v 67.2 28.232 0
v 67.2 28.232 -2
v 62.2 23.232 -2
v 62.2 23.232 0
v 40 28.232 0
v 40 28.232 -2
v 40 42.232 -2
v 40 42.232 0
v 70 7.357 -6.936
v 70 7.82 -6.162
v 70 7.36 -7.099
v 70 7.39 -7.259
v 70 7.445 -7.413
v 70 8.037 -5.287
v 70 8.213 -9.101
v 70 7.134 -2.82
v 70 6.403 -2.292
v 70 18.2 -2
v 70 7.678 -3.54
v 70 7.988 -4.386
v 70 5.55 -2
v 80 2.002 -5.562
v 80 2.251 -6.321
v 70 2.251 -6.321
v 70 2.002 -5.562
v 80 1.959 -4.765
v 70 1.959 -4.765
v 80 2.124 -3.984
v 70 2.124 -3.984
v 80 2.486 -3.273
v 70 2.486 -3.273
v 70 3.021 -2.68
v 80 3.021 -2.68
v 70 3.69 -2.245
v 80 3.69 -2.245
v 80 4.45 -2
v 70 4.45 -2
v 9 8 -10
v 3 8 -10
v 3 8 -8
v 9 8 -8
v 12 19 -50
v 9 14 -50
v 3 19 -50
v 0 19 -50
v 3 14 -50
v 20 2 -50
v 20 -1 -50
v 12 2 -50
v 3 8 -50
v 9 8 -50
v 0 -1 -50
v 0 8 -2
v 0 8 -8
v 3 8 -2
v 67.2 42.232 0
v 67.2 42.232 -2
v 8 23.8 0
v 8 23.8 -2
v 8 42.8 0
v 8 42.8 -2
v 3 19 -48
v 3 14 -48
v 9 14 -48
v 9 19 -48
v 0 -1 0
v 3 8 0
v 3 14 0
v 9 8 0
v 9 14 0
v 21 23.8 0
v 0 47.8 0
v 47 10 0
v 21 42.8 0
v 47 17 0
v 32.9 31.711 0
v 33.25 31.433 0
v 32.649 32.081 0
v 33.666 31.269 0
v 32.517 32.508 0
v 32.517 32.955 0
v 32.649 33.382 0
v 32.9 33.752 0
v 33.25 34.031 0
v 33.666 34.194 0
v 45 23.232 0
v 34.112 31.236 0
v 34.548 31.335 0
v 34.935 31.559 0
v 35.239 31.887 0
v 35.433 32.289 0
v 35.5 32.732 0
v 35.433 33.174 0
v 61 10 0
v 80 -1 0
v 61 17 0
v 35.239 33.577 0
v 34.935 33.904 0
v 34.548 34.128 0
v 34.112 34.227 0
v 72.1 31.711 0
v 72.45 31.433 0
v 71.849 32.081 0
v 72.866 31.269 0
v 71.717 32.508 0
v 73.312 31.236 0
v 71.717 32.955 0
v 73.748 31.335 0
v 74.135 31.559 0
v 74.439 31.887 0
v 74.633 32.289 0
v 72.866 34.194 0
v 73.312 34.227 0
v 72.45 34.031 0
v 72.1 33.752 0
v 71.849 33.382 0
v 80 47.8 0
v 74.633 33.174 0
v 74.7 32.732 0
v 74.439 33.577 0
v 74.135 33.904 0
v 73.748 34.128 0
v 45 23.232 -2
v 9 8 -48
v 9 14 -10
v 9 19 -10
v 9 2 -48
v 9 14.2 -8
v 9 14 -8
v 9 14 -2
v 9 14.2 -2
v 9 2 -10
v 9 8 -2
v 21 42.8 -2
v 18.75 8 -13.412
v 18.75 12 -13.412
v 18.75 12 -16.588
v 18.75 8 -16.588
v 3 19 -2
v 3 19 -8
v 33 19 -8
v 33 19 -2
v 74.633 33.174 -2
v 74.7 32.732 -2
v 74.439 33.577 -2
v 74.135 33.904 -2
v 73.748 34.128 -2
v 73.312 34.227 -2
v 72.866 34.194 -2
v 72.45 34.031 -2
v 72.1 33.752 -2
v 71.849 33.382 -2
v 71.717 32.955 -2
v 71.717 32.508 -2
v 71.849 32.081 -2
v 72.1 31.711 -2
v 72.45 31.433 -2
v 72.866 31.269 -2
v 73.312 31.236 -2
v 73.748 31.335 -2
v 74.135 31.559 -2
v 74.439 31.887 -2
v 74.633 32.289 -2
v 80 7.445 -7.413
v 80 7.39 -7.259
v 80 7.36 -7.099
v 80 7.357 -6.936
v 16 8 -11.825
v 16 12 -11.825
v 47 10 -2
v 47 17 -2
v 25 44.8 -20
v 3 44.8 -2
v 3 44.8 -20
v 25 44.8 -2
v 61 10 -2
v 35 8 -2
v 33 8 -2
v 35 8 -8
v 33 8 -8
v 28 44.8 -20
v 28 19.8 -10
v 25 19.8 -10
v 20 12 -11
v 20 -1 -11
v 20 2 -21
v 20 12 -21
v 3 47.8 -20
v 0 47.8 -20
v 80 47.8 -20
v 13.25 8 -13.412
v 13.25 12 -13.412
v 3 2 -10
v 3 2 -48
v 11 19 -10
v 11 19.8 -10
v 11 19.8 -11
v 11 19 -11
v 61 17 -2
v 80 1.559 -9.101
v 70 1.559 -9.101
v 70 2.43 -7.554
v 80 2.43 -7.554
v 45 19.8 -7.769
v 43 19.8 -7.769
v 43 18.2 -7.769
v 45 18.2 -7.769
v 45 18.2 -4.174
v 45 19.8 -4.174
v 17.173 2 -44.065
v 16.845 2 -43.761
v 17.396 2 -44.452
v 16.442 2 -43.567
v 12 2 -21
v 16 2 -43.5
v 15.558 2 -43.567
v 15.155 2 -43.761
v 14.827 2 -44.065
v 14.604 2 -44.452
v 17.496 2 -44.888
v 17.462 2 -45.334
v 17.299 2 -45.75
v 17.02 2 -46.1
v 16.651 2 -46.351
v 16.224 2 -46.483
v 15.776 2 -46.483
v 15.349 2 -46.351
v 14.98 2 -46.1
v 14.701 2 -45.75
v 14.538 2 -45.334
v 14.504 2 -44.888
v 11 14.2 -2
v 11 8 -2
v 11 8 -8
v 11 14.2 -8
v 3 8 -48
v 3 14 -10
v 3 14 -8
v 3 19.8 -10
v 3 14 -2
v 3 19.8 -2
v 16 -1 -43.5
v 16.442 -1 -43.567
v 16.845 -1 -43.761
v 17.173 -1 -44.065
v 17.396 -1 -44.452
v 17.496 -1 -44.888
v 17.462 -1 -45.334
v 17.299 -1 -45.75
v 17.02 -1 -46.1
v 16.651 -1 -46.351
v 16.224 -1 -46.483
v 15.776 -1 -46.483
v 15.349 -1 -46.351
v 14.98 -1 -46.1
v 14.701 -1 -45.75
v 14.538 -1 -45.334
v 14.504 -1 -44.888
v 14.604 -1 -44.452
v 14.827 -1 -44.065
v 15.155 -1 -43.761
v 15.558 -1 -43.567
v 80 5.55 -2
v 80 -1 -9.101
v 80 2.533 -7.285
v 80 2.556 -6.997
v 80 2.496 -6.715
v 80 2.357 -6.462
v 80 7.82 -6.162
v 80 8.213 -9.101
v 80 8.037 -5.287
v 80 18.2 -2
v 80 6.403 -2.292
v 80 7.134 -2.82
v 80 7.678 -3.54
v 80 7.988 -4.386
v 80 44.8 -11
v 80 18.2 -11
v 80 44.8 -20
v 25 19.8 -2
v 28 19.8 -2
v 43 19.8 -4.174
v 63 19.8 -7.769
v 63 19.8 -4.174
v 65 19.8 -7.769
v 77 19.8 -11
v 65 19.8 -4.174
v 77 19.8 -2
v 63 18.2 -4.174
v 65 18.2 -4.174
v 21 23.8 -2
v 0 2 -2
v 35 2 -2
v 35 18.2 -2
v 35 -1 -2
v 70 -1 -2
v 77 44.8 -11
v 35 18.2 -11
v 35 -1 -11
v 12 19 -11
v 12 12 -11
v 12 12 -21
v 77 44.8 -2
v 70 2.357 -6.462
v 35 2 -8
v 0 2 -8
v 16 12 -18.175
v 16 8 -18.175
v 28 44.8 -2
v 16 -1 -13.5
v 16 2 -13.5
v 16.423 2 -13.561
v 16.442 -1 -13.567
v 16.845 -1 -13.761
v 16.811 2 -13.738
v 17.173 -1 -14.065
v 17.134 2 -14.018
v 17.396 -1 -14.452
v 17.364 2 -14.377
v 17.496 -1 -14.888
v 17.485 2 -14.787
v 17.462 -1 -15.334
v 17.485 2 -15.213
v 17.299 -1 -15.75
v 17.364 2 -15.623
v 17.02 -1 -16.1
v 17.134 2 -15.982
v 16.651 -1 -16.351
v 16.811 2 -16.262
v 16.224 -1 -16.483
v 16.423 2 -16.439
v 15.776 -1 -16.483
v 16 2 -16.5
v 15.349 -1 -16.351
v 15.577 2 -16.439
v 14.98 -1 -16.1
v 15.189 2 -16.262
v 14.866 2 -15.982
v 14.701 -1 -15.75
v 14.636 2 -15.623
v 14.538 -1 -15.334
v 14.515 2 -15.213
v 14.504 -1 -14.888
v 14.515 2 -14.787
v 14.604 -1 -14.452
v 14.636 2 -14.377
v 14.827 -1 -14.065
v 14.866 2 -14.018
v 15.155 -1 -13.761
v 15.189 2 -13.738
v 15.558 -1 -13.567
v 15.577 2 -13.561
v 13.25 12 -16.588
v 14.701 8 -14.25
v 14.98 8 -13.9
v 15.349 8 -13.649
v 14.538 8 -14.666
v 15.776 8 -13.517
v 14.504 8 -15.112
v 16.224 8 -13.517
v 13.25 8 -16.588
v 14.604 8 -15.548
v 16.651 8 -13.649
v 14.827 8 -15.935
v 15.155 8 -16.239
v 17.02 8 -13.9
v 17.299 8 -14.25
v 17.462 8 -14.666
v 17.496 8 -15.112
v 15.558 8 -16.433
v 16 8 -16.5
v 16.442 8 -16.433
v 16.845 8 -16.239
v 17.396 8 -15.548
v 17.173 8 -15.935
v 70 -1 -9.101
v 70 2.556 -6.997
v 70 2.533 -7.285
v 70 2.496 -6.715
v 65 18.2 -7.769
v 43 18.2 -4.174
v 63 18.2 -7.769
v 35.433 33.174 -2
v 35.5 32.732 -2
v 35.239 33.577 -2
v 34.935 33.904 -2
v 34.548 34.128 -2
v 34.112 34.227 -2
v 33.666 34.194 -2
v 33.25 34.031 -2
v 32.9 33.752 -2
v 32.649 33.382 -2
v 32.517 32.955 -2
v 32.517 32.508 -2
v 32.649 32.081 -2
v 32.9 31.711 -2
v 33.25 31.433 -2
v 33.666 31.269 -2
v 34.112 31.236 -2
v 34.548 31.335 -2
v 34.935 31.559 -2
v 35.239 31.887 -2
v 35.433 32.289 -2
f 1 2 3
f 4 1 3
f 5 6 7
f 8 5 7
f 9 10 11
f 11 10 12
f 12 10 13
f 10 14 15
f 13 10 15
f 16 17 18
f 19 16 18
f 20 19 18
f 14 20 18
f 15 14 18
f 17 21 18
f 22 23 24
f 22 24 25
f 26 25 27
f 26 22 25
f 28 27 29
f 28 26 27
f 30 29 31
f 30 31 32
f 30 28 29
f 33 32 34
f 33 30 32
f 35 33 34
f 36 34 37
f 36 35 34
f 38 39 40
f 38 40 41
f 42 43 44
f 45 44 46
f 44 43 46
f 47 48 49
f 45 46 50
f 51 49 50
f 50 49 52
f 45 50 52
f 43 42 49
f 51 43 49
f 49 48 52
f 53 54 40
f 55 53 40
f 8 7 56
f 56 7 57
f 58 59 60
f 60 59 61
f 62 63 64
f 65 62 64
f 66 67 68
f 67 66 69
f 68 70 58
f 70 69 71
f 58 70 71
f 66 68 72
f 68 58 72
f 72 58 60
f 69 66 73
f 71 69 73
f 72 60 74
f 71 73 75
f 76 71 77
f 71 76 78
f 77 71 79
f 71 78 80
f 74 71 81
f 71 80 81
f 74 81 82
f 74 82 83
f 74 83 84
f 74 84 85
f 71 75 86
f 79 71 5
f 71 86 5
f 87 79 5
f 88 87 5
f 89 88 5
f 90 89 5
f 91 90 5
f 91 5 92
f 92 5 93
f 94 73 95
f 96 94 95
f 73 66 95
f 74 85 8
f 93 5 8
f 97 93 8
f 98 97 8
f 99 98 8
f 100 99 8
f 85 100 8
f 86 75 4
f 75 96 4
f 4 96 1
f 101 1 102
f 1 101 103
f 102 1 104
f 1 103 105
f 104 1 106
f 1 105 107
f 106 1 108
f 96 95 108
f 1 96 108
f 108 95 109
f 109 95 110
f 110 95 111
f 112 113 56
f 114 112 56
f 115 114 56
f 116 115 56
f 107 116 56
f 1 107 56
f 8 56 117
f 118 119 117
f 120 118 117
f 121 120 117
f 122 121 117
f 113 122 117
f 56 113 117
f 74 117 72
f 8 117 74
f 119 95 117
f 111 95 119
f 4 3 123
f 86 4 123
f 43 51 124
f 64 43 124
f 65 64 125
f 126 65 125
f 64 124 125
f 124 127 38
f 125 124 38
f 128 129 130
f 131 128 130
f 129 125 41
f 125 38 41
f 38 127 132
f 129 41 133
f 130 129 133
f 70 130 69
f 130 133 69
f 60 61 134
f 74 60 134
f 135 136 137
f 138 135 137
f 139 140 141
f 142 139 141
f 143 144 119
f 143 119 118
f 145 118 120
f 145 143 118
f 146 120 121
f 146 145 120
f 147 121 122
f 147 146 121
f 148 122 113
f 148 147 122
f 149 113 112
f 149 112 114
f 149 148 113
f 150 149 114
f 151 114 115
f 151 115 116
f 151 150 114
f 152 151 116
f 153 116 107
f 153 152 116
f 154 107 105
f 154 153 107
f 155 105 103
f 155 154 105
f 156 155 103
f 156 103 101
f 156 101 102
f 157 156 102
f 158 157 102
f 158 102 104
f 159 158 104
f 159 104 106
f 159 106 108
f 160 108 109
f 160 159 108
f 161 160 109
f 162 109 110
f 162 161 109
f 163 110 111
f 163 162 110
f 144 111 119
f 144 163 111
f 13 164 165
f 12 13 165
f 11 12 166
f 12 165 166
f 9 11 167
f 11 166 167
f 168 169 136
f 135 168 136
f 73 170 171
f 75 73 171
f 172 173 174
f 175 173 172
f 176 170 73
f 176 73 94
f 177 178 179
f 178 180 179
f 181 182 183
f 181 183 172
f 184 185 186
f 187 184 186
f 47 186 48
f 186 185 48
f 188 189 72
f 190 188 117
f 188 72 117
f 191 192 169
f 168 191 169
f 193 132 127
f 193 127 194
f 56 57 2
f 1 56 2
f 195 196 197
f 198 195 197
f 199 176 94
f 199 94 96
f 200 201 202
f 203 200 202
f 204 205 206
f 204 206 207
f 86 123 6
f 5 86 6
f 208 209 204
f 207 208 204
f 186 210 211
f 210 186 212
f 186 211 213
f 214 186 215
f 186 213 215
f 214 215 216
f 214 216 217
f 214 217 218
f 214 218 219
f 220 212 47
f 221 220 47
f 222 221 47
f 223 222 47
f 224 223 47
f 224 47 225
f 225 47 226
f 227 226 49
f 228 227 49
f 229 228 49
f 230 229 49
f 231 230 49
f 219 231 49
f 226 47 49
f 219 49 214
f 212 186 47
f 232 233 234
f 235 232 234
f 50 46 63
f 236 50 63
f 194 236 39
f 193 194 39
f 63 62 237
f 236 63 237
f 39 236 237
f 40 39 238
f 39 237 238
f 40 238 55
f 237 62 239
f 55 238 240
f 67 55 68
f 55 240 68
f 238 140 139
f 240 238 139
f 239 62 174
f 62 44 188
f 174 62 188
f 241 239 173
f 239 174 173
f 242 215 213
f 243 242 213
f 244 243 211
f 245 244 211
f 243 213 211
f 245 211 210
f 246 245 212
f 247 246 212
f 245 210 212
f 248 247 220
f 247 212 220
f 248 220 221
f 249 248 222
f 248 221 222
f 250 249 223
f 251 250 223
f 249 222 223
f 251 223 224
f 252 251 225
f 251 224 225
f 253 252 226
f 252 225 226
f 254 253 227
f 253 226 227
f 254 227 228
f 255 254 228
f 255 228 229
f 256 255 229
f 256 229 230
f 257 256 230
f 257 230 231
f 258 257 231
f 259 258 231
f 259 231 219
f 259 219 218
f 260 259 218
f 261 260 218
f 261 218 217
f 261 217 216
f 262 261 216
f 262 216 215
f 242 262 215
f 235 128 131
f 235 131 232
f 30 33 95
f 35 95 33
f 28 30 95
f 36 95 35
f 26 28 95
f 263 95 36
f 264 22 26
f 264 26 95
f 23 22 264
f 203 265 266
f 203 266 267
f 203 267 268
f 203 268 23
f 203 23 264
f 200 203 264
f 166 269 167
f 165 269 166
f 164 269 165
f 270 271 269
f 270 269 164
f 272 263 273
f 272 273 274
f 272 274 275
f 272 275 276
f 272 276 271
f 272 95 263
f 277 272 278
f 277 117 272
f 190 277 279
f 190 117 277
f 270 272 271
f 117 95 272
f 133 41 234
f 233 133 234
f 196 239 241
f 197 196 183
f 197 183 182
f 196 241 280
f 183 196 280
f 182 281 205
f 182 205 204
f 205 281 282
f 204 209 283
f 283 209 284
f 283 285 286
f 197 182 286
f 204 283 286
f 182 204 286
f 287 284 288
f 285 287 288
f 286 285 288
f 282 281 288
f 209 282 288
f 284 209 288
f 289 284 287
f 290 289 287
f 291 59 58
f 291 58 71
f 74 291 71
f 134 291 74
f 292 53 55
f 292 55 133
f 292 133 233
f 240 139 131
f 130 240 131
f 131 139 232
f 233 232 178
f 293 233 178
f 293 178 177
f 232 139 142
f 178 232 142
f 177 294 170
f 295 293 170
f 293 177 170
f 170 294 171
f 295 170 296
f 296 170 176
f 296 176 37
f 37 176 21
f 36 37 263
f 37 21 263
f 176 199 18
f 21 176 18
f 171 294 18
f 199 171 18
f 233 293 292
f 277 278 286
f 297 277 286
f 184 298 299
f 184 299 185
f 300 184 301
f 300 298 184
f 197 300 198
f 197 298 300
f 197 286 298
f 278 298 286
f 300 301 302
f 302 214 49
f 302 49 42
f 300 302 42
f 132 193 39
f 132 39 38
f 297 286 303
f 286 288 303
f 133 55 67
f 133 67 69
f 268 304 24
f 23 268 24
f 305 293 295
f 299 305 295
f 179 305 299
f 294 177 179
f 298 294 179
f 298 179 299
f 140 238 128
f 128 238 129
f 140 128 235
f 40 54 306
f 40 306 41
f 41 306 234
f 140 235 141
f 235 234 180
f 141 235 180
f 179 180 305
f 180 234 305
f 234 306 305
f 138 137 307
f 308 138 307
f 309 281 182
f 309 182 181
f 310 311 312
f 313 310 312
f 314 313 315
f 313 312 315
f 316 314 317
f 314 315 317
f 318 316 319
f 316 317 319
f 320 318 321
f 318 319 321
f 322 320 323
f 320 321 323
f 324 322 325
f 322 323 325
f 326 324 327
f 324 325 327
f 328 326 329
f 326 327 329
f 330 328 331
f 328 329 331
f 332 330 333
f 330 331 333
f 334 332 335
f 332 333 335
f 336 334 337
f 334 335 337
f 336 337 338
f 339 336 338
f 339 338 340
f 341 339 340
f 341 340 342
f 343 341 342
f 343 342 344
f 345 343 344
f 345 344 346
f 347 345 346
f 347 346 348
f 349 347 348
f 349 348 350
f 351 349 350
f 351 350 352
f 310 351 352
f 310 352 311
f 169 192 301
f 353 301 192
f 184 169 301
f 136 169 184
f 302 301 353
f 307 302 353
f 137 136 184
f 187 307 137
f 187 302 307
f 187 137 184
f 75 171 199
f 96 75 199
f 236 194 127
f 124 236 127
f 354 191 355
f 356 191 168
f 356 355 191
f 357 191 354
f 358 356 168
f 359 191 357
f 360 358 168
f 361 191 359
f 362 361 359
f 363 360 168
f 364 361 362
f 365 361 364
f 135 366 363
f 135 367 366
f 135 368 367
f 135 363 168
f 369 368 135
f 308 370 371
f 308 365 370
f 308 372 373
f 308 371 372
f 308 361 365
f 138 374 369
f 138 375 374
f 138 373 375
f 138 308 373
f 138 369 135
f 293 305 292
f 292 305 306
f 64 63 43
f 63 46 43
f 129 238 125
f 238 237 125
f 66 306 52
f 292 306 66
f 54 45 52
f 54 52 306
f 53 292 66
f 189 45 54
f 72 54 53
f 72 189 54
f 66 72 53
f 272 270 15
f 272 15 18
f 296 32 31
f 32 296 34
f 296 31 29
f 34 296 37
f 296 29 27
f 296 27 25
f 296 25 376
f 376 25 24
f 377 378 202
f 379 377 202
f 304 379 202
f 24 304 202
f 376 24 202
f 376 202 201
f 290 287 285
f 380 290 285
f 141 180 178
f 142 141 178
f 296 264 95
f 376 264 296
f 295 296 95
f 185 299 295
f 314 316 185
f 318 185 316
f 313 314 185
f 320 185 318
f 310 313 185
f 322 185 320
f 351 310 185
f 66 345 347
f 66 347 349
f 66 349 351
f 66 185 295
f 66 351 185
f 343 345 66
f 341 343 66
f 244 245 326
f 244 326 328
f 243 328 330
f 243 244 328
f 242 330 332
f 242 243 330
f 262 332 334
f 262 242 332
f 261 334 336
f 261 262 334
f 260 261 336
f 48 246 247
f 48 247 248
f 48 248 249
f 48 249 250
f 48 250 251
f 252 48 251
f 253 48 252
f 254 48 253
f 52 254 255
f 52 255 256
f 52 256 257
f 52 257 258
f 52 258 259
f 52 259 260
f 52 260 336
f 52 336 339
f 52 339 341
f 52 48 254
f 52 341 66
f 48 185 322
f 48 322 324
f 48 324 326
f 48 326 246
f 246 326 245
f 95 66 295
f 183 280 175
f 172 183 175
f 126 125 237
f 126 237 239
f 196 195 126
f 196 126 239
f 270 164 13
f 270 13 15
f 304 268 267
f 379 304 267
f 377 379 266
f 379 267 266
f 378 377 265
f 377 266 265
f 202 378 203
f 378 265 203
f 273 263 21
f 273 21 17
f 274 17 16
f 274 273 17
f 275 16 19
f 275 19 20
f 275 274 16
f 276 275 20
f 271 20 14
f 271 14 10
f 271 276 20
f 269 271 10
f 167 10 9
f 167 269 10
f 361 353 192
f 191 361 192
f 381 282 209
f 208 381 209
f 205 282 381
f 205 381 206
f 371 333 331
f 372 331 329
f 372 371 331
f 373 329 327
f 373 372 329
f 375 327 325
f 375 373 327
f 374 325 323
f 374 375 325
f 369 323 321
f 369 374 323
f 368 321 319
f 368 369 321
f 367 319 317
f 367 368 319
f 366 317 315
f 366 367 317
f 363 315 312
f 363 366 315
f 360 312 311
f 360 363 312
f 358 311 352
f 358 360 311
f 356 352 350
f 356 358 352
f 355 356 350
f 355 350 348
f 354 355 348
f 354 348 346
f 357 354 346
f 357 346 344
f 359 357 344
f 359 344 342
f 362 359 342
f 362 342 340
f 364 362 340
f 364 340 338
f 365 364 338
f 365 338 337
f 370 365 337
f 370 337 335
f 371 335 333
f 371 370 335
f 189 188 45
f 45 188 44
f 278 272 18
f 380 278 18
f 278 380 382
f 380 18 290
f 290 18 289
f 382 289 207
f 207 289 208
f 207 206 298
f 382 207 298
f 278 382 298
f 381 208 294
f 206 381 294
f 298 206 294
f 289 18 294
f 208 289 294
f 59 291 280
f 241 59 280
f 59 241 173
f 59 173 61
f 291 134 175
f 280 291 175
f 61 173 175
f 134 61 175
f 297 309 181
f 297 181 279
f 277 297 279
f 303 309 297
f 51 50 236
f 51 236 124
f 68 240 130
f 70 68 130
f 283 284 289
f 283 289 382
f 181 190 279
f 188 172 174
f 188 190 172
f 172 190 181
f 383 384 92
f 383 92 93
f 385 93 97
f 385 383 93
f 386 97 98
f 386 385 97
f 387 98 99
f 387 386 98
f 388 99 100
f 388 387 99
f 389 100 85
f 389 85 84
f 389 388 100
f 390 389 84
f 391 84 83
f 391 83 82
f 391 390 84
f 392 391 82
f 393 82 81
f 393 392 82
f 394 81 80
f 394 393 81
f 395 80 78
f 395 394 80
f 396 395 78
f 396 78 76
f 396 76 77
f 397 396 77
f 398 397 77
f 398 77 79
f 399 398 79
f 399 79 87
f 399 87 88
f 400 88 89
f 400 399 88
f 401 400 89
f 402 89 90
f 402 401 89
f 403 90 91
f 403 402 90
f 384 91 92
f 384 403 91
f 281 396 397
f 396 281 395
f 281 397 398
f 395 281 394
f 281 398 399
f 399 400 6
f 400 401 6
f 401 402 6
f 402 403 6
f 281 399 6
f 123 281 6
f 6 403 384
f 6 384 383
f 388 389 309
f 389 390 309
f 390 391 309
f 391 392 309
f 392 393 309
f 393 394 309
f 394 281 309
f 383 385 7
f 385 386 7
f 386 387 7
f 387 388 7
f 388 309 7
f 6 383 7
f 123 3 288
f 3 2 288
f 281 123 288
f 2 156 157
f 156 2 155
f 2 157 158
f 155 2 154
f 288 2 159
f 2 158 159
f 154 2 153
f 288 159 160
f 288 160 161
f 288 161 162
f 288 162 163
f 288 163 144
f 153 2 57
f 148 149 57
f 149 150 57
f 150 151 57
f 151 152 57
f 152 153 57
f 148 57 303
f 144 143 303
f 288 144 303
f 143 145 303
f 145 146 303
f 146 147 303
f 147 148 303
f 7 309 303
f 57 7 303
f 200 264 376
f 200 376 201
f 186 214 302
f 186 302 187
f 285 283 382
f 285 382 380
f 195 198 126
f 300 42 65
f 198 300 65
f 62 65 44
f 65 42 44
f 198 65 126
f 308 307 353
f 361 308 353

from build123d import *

# Parameters (mm, degrees)
RESSALTO_EXTRUS_O1_DEPTH      = 2
RESSALTO_EXTRUS_O1_DEPTH_BACK = 1
ESBO_O1_3_W                   = 35
ESBO_O1_3_H                   = 2
RESSALTO_EXTRUS_O2_DEPTH      = 8
RESSALTO_EXTRUS_O3_DEPTH      = 8
RESSALTO_EXTRUS_O5_START      = 8
ESBO_O1_5_W                   = 3
ESBO_O1_5_H                   = 50
ESBO_O1_5_W_2                 = 22
ESBO_O1_5_H_2                 = 6
RESSALTO_EXTRUS_O5_DEPTH      = 6.2
RESSALTO_EXTRUS_O6_START      = 14
ESBO_O1_6_W                   = 2
ESBO_O1_6_H                   = 6
ESBO_O1_6_H_2                 = 2
ESBO_O1_6_W_2                 = 22
ESBO_O1_6_W_3                 = 6
ESBO_O1_6_W_4                 = 3
ESBO_O1_6_H_3                 = 38
RESSALTO_EXTRUS_O6_DEPTH      = 5
ESBO_O5_R                     = 1.5
CORTE_EXTRUS_O2_DEPTH         = 10
RESSALTO_EXTRUS_O7_START      = -2
ESBO_O6_W                     = 13
ESBO_O6_H                     = 19
ESBO_O6_R                     = 1.5
ESBO_O6_W_2                   = 14
ESBO_O6_H_2                   = 7
RESSALTO_EXTRUS_O7_DEPTH      = 2
RESSALTO_EXTRUS_O8_START      = -10
ESBO_O6_3_W                   = 45
ESBO_O6_3_H                   = 0.8
RESSALTO_EXTRUS_O8_DEPTH      = 8
ESBO_O7_W                     = 2
ESBO_O7_H                     = 3.59531288
CORTE_EXTRUS_O3_DEPTH         = 10
ESBO_O11_W                    = 80
ESBO_O11_H                    = 3
RESSALTO_EXTRUS_O11_DEPTH     = 20
ESBO_O12_W                    = 3
ESBO_O12_H                    = 25
RESSALTO_EXTRUS_O12_DEPTH     = 18
RESSALTO_EXTRUS_O9_START      = -3
RESSALTO_EXTRUS_O9_DEPTH      = 3
ESBO_O10_W                    = 10
ESBO_O10_H                    = 25
RESSALTO_EXTRUS_O10_DEPTH     = 3
ESBO_O13_W                    = 4.849706681
ESBO_O13_H                    = 25
CORTE_EXTRUS_O4_DEPTH         = 10
RESSALTO_EXTRUS_O13_REACH     = 84.522
ESBO_O14_W                    = 1
ESBO_O14_H                    = 20.8
ESBO_O15_W                    = 1
ESBO_O15_H                    = 20
RESSALTO_EXTRUS_O14_DEPTH     = 39
ESBO_O20_W                    = 8
ESBO_O20_H                    = 10
RESSALTO_EXTRUS_O18_DEPTH     = 10
CORTE_EXTRUS_O6_START         = -10
ESBO_O21_R                    = 1.5
CORTE_EXTRUS_O6_DEPTH         = 10
RESSALTO_EXTRUS_O19_DEPTH     = 1
CORTE_EXTRUS_O7_DEPTH         = 4
RESSALTO_EXTRUS_O20_DEPTH     = 10
FILETE1_R                     = 1


with BuildPart() as part:
    # Esboço1 → Ressalto-extrusão1 (new, two sides: drawn at the far end of the back side and taken through both)
    with BuildSketch(Plane(origin=(0, 0, 0), x_dir=(1, 0, 0), z_dir=(0, 1, 0)).offset(-RESSALTO_EXTRUS_O1_DEPTH_BACK)):
        Polygon((0, 0), (0, 50), (20, 50), (20, 10), (35, 10), (35, 0), align=None)
    extrude(amount=RESSALTO_EXTRUS_O1_DEPTH + RESSALTO_EXTRUS_O1_DEPTH_BACK)

    # Esboço1<3> → Ressalto-extrusão2 (add)
    with BuildSketch(Plane(origin=(0, 0, 0), x_dir=(1, 0, 0), z_dir=(0, 1, 0))):
        with Locations((17.5, 1)):
            Rectangle(ESBO_O1_3_W, ESBO_O1_3_H)
        with Locations((17.5, 9)):
            Rectangle(ESBO_O1_3_W, ESBO_O1_3_H)
    extrude(amount=RESSALTO_EXTRUS_O2_DEPTH)

    # Esboço1<4> → Ressalto-extrusão3 (add)
    with BuildSketch(Plane(origin=(0, 0, 0), x_dir=(1, 0, 0), z_dir=(0, 1, 0))):
        Polygon((0, 10), (3, 10), (3, 48), (9, 48), (9, 10), (11, 10), (11, 50), (0, 50), align=None)
    extrude(amount=RESSALTO_EXTRUS_O3_DEPTH)

    # Esboço1<5> → Ressalto-extrusão5 (add)
    # profile 1 of 2: a face of its own
    with BuildSketch(Plane(origin=(0, 0, 0), x_dir=(1, 0, 0), z_dir=(0, 1, 0)).offset(RESSALTO_EXTRUS_O5_START)):
        with Locations((1.5, 25)):
            Rectangle(ESBO_O1_5_W, ESBO_O1_5_H)
    # profile 2 of 2: a face of its own
    with BuildSketch(Plane(origin=(0, 0, 0), x_dir=(1, 0, 0), z_dir=(0, 1, 0)).offset(RESSALTO_EXTRUS_O5_START)):
        Polygon((35, 0), (35, 10), (11, 10), (11, 50), (9, 50), (9, 0), align=None)
        with Locations((22, 5)):
            Rectangle(ESBO_O1_5_W_2, ESBO_O1_5_H_2, mode=Mode.SUBTRACT)
    extrude(amount=RESSALTO_EXTRUS_O5_DEPTH)

    # Esboço1<6> → Ressalto-extrusão6 (add)
    with BuildSketch(Plane(origin=(0, 0, 0), x_dir=(1, 0, 0), z_dir=(0, 1, 0)).offset(RESSALTO_EXTRUS_O6_START)):
        with Locations((34, 5)):
            Rectangle(ESBO_O1_6_W, ESBO_O1_6_H)
        with Locations((34, 1)):
            Rectangle(ESBO_O1_6_W, ESBO_O1_6_H_2)
        with Locations((22, 1)):
            Rectangle(ESBO_O1_6_W_2, ESBO_O1_6_H_2)
        with Locations((34, 9)):
            Rectangle(ESBO_O1_6_W, ESBO_O1_6_H_2)
        Polygon((11, 10), (11, 8), (33, 8), (33, 10), (20, 10), align=None)
        with Locations((10, 1)):
            Rectangle(ESBO_O1_6_W, ESBO_O1_6_H_2)
        with Locations((6, 1)):
            Rectangle(ESBO_O1_6_W_3, ESBO_O1_6_H_2)
        with Locations((1.5, 1)):
            Rectangle(ESBO_O1_6_W_4, ESBO_O1_6_H_2)
        with Locations((1.5, 5)):
            Rectangle(ESBO_O1_6_W_4, ESBO_O1_6_H)
        with Locations((1.5, 9)):
            Rectangle(ESBO_O1_6_W_4, ESBO_O1_6_H_2)
        with Locations((1.5, 29)):
            Rectangle(ESBO_O1_6_W_4, ESBO_O1_6_H_3)
        with Locations((1.5, 49)):
            Rectangle(ESBO_O1_6_W_4, ESBO_O1_6_H_2)
        with Locations((6, 9)):
            Rectangle(ESBO_O1_6_W_3, ESBO_O1_6_H_2)
        with Locations((10, 9)):
            Rectangle(ESBO_O1_6_W, ESBO_O1_6_H_2)
        with Locations((6, 49)):
            Rectangle(ESBO_O1_6_W_3, ESBO_O1_6_H_2)
        with Locations((10, 49)):
            Rectangle(ESBO_O1_6_W, ESBO_O1_6_H_2)
        with Locations((10, 29)):
            Rectangle(ESBO_O1_6_W, ESBO_O1_6_H_3)
    extrude(amount=RESSALTO_EXTRUS_O6_DEPTH)

    # Esboço5 → Corte-extrusão2 (cut)
    with BuildSketch(Plane(origin=(0, 2, 0), x_dir=(1, 0, 0), z_dir=(0, 1, 0))):
        with Locations(Location((16, 15, 0), (0, 0, 270))):
            Circle(ESBO_O5_R)
        with Locations(Location((16, 45, 0), (0, 0, 270))):
            Circle(ESBO_O5_R)
    extrude(amount=-CORTE_EXTRUS_O2_DEPTH, mode=Mode.SUBTRACT)

    # Esboço6 → Ressalto-extrusão7 (add)
    with BuildSketch(Plane.XY.offset(RESSALTO_EXTRUS_O7_START)):
        Polygon((80, 44.8), (0, 44.8), (0, 19), (35, 19), (35, -1), (80, -1), align=None)
        with Locations((14.5, 33.3)):
            Rectangle(ESBO_O6_W, ESBO_O6_H, mode=Mode.SUBTRACT)
        with Locations((34, 32.731591612)):
            Circle(ESBO_O6_R, mode=Mode.SUBTRACT)
        Polygon((45, 23.231591612), (40, 28.231591612), (40, 42.231591612), (67.2, 42.231591612), (67.2, 28.231591612), (62.2, 23.231591612), align=None, mode=Mode.SUBTRACT)
        with Locations((73.2, 32.731591612)):
            Circle(ESBO_O6_R, mode=Mode.SUBTRACT)
        with Locations((54, 13.5)):
            Rectangle(ESBO_O6_W_2, ESBO_O6_H_2, mode=Mode.SUBTRACT)
    extrude(amount=RESSALTO_EXTRUS_O7_DEPTH)

    # Esboço6<3> → Ressalto-extrusão8 (add)
    with BuildSketch(Plane.XY.offset(RESSALTO_EXTRUS_O8_START)):
        Polygon((80, 19.8), (0, 19.8), (0, 19), (35, 19), (80, 19), align=None)
        with Locations((57.5, 18.6)):
            Rectangle(ESBO_O6_3_W, ESBO_O6_3_H)
    extrude(amount=RESSALTO_EXTRUS_O8_DEPTH)

    # Esboço7 → Corte-extrusão3 (cut)
    with BuildSketch(Plane(origin=(0, 19.8, 0), x_dir=(1, 0, 0), z_dir=(0, 1, 0))):
        with Locations((44, 5.971535205)):
            Rectangle(ESBO_O7_W, ESBO_O7_H)
        with Locations((64, 5.971535205)):
            Rectangle(ESBO_O7_W, ESBO_O7_H)
    extrude(amount=-CORTE_EXTRUS_O3_DEPTH, mode=Mode.SUBTRACT)

    # Esboço11 → Ressalto-extrusão11 (add)
    with BuildSketch(Plane.XY):
        with Locations((40, 46.3)):
            Rectangle(ESBO_O11_W, ESBO_O11_H)
    extrude(amount=-RESSALTO_EXTRUS_O11_DEPTH)

    # Esboço12 → Ressalto-extrusão12 (add)
    with BuildSketch(Plane(origin=(0, 0, -2), x_dir=(-1, 0, 0), z_dir=(0, 0, -1))):
        with Locations((-26.5, 32.3)):
            Rectangle(ESBO_O12_W, ESBO_O12_H)
    extrude(amount=RESSALTO_EXTRUS_O12_DEPTH)

    # Esboço9 → Ressalto-extrusão9 (add)
    with BuildSketch(Plane.ZY.offset(RESSALTO_EXTRUS_O9_START)):
        Polygon((-20, 47.8), (-50, 19), (-2, 19), (-2, 47.8), align=None)
    extrude(amount=RESSALTO_EXTRUS_O9_DEPTH)

    # Esboço10 → Ressalto-extrusão10 (add)
    with BuildSketch(Plane(origin=(80, 0, 0), x_dir=(0, 0, -1), z_dir=(1, 0, 0))):
        with Locations((5, 32.3)):
            Rectangle(ESBO_O10_W, ESBO_O10_H)
    extrude(amount=-RESSALTO_EXTRUS_O10_DEPTH)

    # Esboço13 → Corte-extrusão4 (cut)
    with BuildSketch(Plane(origin=(28, 0, 0), x_dir=(0, 0, -1), z_dir=(1, 0, 0))):
        with Locations((22.424853341, 32.3)):
            Rectangle(ESBO_O13_W, ESBO_O13_H)
        Polygon((10, 19.8), (20, 44.8), (20, 19.8), align=None)
    extrude(amount=-CORTE_EXTRUS_O4_DEPTH, mode=Mode.SUBTRACT)

    # Ressalto-extrusão13: up to this face of the body (flat: up to its plane)
    ressalto_extrus_o13_end = Plane(part.part.faces().sort_by_distance((11, 10.5, -30))[0])
    # Esboço14 → Ressalto-extrusão13 (add, up to the picked face)
    with BuildSketch(Plane(origin=(35, 0, 0), x_dir=(0, 0, -1), z_dir=(1, 0, 0)), mode=Mode.PRIVATE) as ressalto_extrus_o13_sk1:
        with Locations((10.5, 9.4)):
            Rectangle(ESBO_O14_W, ESBO_O14_H)
    ressalto_extrus_o13_tool1 = split(extrude(ressalto_extrus_o13_sk1.sketch, amount=-RESSALTO_EXTRUS_O13_REACH, mode=Mode.PRIVATE), bisect_by=ressalto_extrus_o13_end, keep=Keep.BOTH, mode=Mode.PRIVATE)
    add(ressalto_extrus_o13_tool1.solids().sort_by(Axis((35, 9.4, -10.5), (-1, 0, 0)))[0])

    # Esboço15 → Ressalto-extrusão14 (add)
    with BuildSketch(Plane(origin=(0, 0, -50), x_dir=(-1, 0, 0), z_dir=(0, 0, -1))):
        with Locations((-11.5, 9)):
            Rectangle(ESBO_O15_W, ESBO_O15_H)
    extrude(amount=-RESSALTO_EXTRUS_O14_DEPTH)

    # Esboço20 → Ressalto-extrusão18 (add)
    with BuildSketch(Plane(origin=(0, 2, 0), x_dir=(1, 0, 0), z_dir=(0, 1, 0))):
        with Locations((16, 16)):
            Rectangle(ESBO_O20_W, ESBO_O20_H)
    extrude(amount=RESSALTO_EXTRUS_O18_DEPTH)

    # Esboço21 → Corte-extrusão6 (cut)
    with BuildSketch(Plane.XZ.offset(-2).offset(CORTE_EXTRUS_O6_START)):
        with Locations(Location((16, -15, 0), (0, 0, 270))):
            Circle(ESBO_O21_R)
    extrude(amount=CORTE_EXTRUS_O6_DEPTH, mode=Mode.SUBTRACT)

    # Esboço22 → Ressalto-extrusão19 (add)
    with BuildSketch(Plane(origin=(0, 0, -10), x_dir=(-1, 0, 0), z_dir=(0, 0, -1))):
        Polygon((-35, 18.2), (-35, 19.8), (-77, 19.8), (-77, 44.8), (-80, 44.8), (-80, 18.2), align=None)
    extrude(amount=RESSALTO_EXTRUS_O19_DEPTH)

    # Esboço23 → Corte-extrusão7 (cut)
    with BuildSketch(Plane(origin=(0, 12, 0), x_dir=(1, 0, 0), z_dir=(0, 1, 0))):
        Polygon((18.75, 16.58771324), (16, 18.175426481), (13.25, 16.58771324), (13.25, 13.41228676), (16, 11.824573519), (18.75, 13.41228676), align=None)
        Polygon((18.75, 43.41228676), (18.75, 46.58771324), (16, 48.175426481), (13.25, 46.58771324), (13.25, 43.41228676), (16, 41.824573519), align=None)
    extrude(amount=-CORTE_EXTRUS_O7_DEPTH, mode=Mode.SUBTRACT)

    # Esboço24 → Ressalto-extrusão20 (add)
    with BuildSketch(Plane(origin=(80, 0, 0), x_dir=(0, 0, -1), z_dir=(1, 0, 0))):
        with BuildLine():
            Line((9.100514075, 8.213270058), (2, 18.2))
            Line((2, 18.2), (2, 5.55))
            ThreePointArc((2, 5.55), (3.951321001, 7.864048246), (6.935535628, 7.357159696))
            Line((6.935535628, 7.357159696), (6.984313483, 7.25))
            Line((6.984313483, 7.25), (9.100514075, 8.213270058))
        make_face()
        with BuildLine():
            Line((2, 4.45), (2, -1))
            Line((2, -1), (9.100514075, -1))
            Line((9.100514075, -1), (9.100514075, 1.559444743))
            Line((9.100514075, 1.559444743), (6.984313483, 2.75))
            Line((6.984313483, 2.75), (6.320880397, 2.25085923))
            ThreePointArc((6.320880397, 2.25085923), (3.616556582, 2.281804954), (2, 4.45))
        make_face()
    extrude(amount=-RESSALTO_EXTRUS_O20_DEPTH)

    # Filete1
    # the kernel refuses this fillet: 1 mm, written as the material it takes off along each edge
    with BuildSketch(Plane(origin=(81.633402331, 2.75, -6.984313483), x_dir=(0, -0.4903214392898115, -0.8715416720804391), z_dir=(-1, 0, 0))) as filete1_piece_1:
        with BuildLine():
            CenterArc((FILETE1_R * 0.653360932246, FILETE1_R), FILETE1_R, 203.681935757, 66.318064243)
            Line((-FILETE1_R * 0.262428341882, FILETE1_R * 0.598340933885), (-FILETE1_R * 0.280744127364, FILETE1_R * 0.590307752563))
            Line((-FILETE1_R * 0.280744127364, FILETE1_R * 0.590307752563), (-FILETE1_R * 0.0130672186449, -FILETE1_R * 0.02))
            Line((-FILETE1_R * 0.0130672186449, -FILETE1_R * 0.02), (FILETE1_R * 0.653360932246, -FILETE1_R * 0.02))
            Line((FILETE1_R * 0.653360932246, -FILETE1_R * 0.02), (FILETE1_R * 0.653360932246, 0))
        make_face()
    extrude(amount=13.266804661, mode=Mode.SUBTRACT)
    with BuildSketch(Plane(origin=(81.176901612, 7.25, -6.984313483), x_dir=(0, 0.910145890185138, 0.4142878933532846), z_dir=(-1, 0, 0))) as filete1_piece_2:
        with BuildLine():
            CenterArc((1, 0.470760645), FILETE1_R, 180, 28.083682979)
            Line((0, 0.470760645), (-0.02, 0.470760645))
            Line((-0.02, 0.470760645), (-0.02, 0))
            Line((-0.02, 0), (0, -0.02))
            ThreePointArc((0, -0.02), (0.058869516, -0.02), (0.100093813, -0.009415213))
            Line((0.100093813, -0.009415213), (0.117739032, 0))
        make_face()
    extrude(amount=12.353803225, mode=Mode.SUBTRACT)


solid = part.part
